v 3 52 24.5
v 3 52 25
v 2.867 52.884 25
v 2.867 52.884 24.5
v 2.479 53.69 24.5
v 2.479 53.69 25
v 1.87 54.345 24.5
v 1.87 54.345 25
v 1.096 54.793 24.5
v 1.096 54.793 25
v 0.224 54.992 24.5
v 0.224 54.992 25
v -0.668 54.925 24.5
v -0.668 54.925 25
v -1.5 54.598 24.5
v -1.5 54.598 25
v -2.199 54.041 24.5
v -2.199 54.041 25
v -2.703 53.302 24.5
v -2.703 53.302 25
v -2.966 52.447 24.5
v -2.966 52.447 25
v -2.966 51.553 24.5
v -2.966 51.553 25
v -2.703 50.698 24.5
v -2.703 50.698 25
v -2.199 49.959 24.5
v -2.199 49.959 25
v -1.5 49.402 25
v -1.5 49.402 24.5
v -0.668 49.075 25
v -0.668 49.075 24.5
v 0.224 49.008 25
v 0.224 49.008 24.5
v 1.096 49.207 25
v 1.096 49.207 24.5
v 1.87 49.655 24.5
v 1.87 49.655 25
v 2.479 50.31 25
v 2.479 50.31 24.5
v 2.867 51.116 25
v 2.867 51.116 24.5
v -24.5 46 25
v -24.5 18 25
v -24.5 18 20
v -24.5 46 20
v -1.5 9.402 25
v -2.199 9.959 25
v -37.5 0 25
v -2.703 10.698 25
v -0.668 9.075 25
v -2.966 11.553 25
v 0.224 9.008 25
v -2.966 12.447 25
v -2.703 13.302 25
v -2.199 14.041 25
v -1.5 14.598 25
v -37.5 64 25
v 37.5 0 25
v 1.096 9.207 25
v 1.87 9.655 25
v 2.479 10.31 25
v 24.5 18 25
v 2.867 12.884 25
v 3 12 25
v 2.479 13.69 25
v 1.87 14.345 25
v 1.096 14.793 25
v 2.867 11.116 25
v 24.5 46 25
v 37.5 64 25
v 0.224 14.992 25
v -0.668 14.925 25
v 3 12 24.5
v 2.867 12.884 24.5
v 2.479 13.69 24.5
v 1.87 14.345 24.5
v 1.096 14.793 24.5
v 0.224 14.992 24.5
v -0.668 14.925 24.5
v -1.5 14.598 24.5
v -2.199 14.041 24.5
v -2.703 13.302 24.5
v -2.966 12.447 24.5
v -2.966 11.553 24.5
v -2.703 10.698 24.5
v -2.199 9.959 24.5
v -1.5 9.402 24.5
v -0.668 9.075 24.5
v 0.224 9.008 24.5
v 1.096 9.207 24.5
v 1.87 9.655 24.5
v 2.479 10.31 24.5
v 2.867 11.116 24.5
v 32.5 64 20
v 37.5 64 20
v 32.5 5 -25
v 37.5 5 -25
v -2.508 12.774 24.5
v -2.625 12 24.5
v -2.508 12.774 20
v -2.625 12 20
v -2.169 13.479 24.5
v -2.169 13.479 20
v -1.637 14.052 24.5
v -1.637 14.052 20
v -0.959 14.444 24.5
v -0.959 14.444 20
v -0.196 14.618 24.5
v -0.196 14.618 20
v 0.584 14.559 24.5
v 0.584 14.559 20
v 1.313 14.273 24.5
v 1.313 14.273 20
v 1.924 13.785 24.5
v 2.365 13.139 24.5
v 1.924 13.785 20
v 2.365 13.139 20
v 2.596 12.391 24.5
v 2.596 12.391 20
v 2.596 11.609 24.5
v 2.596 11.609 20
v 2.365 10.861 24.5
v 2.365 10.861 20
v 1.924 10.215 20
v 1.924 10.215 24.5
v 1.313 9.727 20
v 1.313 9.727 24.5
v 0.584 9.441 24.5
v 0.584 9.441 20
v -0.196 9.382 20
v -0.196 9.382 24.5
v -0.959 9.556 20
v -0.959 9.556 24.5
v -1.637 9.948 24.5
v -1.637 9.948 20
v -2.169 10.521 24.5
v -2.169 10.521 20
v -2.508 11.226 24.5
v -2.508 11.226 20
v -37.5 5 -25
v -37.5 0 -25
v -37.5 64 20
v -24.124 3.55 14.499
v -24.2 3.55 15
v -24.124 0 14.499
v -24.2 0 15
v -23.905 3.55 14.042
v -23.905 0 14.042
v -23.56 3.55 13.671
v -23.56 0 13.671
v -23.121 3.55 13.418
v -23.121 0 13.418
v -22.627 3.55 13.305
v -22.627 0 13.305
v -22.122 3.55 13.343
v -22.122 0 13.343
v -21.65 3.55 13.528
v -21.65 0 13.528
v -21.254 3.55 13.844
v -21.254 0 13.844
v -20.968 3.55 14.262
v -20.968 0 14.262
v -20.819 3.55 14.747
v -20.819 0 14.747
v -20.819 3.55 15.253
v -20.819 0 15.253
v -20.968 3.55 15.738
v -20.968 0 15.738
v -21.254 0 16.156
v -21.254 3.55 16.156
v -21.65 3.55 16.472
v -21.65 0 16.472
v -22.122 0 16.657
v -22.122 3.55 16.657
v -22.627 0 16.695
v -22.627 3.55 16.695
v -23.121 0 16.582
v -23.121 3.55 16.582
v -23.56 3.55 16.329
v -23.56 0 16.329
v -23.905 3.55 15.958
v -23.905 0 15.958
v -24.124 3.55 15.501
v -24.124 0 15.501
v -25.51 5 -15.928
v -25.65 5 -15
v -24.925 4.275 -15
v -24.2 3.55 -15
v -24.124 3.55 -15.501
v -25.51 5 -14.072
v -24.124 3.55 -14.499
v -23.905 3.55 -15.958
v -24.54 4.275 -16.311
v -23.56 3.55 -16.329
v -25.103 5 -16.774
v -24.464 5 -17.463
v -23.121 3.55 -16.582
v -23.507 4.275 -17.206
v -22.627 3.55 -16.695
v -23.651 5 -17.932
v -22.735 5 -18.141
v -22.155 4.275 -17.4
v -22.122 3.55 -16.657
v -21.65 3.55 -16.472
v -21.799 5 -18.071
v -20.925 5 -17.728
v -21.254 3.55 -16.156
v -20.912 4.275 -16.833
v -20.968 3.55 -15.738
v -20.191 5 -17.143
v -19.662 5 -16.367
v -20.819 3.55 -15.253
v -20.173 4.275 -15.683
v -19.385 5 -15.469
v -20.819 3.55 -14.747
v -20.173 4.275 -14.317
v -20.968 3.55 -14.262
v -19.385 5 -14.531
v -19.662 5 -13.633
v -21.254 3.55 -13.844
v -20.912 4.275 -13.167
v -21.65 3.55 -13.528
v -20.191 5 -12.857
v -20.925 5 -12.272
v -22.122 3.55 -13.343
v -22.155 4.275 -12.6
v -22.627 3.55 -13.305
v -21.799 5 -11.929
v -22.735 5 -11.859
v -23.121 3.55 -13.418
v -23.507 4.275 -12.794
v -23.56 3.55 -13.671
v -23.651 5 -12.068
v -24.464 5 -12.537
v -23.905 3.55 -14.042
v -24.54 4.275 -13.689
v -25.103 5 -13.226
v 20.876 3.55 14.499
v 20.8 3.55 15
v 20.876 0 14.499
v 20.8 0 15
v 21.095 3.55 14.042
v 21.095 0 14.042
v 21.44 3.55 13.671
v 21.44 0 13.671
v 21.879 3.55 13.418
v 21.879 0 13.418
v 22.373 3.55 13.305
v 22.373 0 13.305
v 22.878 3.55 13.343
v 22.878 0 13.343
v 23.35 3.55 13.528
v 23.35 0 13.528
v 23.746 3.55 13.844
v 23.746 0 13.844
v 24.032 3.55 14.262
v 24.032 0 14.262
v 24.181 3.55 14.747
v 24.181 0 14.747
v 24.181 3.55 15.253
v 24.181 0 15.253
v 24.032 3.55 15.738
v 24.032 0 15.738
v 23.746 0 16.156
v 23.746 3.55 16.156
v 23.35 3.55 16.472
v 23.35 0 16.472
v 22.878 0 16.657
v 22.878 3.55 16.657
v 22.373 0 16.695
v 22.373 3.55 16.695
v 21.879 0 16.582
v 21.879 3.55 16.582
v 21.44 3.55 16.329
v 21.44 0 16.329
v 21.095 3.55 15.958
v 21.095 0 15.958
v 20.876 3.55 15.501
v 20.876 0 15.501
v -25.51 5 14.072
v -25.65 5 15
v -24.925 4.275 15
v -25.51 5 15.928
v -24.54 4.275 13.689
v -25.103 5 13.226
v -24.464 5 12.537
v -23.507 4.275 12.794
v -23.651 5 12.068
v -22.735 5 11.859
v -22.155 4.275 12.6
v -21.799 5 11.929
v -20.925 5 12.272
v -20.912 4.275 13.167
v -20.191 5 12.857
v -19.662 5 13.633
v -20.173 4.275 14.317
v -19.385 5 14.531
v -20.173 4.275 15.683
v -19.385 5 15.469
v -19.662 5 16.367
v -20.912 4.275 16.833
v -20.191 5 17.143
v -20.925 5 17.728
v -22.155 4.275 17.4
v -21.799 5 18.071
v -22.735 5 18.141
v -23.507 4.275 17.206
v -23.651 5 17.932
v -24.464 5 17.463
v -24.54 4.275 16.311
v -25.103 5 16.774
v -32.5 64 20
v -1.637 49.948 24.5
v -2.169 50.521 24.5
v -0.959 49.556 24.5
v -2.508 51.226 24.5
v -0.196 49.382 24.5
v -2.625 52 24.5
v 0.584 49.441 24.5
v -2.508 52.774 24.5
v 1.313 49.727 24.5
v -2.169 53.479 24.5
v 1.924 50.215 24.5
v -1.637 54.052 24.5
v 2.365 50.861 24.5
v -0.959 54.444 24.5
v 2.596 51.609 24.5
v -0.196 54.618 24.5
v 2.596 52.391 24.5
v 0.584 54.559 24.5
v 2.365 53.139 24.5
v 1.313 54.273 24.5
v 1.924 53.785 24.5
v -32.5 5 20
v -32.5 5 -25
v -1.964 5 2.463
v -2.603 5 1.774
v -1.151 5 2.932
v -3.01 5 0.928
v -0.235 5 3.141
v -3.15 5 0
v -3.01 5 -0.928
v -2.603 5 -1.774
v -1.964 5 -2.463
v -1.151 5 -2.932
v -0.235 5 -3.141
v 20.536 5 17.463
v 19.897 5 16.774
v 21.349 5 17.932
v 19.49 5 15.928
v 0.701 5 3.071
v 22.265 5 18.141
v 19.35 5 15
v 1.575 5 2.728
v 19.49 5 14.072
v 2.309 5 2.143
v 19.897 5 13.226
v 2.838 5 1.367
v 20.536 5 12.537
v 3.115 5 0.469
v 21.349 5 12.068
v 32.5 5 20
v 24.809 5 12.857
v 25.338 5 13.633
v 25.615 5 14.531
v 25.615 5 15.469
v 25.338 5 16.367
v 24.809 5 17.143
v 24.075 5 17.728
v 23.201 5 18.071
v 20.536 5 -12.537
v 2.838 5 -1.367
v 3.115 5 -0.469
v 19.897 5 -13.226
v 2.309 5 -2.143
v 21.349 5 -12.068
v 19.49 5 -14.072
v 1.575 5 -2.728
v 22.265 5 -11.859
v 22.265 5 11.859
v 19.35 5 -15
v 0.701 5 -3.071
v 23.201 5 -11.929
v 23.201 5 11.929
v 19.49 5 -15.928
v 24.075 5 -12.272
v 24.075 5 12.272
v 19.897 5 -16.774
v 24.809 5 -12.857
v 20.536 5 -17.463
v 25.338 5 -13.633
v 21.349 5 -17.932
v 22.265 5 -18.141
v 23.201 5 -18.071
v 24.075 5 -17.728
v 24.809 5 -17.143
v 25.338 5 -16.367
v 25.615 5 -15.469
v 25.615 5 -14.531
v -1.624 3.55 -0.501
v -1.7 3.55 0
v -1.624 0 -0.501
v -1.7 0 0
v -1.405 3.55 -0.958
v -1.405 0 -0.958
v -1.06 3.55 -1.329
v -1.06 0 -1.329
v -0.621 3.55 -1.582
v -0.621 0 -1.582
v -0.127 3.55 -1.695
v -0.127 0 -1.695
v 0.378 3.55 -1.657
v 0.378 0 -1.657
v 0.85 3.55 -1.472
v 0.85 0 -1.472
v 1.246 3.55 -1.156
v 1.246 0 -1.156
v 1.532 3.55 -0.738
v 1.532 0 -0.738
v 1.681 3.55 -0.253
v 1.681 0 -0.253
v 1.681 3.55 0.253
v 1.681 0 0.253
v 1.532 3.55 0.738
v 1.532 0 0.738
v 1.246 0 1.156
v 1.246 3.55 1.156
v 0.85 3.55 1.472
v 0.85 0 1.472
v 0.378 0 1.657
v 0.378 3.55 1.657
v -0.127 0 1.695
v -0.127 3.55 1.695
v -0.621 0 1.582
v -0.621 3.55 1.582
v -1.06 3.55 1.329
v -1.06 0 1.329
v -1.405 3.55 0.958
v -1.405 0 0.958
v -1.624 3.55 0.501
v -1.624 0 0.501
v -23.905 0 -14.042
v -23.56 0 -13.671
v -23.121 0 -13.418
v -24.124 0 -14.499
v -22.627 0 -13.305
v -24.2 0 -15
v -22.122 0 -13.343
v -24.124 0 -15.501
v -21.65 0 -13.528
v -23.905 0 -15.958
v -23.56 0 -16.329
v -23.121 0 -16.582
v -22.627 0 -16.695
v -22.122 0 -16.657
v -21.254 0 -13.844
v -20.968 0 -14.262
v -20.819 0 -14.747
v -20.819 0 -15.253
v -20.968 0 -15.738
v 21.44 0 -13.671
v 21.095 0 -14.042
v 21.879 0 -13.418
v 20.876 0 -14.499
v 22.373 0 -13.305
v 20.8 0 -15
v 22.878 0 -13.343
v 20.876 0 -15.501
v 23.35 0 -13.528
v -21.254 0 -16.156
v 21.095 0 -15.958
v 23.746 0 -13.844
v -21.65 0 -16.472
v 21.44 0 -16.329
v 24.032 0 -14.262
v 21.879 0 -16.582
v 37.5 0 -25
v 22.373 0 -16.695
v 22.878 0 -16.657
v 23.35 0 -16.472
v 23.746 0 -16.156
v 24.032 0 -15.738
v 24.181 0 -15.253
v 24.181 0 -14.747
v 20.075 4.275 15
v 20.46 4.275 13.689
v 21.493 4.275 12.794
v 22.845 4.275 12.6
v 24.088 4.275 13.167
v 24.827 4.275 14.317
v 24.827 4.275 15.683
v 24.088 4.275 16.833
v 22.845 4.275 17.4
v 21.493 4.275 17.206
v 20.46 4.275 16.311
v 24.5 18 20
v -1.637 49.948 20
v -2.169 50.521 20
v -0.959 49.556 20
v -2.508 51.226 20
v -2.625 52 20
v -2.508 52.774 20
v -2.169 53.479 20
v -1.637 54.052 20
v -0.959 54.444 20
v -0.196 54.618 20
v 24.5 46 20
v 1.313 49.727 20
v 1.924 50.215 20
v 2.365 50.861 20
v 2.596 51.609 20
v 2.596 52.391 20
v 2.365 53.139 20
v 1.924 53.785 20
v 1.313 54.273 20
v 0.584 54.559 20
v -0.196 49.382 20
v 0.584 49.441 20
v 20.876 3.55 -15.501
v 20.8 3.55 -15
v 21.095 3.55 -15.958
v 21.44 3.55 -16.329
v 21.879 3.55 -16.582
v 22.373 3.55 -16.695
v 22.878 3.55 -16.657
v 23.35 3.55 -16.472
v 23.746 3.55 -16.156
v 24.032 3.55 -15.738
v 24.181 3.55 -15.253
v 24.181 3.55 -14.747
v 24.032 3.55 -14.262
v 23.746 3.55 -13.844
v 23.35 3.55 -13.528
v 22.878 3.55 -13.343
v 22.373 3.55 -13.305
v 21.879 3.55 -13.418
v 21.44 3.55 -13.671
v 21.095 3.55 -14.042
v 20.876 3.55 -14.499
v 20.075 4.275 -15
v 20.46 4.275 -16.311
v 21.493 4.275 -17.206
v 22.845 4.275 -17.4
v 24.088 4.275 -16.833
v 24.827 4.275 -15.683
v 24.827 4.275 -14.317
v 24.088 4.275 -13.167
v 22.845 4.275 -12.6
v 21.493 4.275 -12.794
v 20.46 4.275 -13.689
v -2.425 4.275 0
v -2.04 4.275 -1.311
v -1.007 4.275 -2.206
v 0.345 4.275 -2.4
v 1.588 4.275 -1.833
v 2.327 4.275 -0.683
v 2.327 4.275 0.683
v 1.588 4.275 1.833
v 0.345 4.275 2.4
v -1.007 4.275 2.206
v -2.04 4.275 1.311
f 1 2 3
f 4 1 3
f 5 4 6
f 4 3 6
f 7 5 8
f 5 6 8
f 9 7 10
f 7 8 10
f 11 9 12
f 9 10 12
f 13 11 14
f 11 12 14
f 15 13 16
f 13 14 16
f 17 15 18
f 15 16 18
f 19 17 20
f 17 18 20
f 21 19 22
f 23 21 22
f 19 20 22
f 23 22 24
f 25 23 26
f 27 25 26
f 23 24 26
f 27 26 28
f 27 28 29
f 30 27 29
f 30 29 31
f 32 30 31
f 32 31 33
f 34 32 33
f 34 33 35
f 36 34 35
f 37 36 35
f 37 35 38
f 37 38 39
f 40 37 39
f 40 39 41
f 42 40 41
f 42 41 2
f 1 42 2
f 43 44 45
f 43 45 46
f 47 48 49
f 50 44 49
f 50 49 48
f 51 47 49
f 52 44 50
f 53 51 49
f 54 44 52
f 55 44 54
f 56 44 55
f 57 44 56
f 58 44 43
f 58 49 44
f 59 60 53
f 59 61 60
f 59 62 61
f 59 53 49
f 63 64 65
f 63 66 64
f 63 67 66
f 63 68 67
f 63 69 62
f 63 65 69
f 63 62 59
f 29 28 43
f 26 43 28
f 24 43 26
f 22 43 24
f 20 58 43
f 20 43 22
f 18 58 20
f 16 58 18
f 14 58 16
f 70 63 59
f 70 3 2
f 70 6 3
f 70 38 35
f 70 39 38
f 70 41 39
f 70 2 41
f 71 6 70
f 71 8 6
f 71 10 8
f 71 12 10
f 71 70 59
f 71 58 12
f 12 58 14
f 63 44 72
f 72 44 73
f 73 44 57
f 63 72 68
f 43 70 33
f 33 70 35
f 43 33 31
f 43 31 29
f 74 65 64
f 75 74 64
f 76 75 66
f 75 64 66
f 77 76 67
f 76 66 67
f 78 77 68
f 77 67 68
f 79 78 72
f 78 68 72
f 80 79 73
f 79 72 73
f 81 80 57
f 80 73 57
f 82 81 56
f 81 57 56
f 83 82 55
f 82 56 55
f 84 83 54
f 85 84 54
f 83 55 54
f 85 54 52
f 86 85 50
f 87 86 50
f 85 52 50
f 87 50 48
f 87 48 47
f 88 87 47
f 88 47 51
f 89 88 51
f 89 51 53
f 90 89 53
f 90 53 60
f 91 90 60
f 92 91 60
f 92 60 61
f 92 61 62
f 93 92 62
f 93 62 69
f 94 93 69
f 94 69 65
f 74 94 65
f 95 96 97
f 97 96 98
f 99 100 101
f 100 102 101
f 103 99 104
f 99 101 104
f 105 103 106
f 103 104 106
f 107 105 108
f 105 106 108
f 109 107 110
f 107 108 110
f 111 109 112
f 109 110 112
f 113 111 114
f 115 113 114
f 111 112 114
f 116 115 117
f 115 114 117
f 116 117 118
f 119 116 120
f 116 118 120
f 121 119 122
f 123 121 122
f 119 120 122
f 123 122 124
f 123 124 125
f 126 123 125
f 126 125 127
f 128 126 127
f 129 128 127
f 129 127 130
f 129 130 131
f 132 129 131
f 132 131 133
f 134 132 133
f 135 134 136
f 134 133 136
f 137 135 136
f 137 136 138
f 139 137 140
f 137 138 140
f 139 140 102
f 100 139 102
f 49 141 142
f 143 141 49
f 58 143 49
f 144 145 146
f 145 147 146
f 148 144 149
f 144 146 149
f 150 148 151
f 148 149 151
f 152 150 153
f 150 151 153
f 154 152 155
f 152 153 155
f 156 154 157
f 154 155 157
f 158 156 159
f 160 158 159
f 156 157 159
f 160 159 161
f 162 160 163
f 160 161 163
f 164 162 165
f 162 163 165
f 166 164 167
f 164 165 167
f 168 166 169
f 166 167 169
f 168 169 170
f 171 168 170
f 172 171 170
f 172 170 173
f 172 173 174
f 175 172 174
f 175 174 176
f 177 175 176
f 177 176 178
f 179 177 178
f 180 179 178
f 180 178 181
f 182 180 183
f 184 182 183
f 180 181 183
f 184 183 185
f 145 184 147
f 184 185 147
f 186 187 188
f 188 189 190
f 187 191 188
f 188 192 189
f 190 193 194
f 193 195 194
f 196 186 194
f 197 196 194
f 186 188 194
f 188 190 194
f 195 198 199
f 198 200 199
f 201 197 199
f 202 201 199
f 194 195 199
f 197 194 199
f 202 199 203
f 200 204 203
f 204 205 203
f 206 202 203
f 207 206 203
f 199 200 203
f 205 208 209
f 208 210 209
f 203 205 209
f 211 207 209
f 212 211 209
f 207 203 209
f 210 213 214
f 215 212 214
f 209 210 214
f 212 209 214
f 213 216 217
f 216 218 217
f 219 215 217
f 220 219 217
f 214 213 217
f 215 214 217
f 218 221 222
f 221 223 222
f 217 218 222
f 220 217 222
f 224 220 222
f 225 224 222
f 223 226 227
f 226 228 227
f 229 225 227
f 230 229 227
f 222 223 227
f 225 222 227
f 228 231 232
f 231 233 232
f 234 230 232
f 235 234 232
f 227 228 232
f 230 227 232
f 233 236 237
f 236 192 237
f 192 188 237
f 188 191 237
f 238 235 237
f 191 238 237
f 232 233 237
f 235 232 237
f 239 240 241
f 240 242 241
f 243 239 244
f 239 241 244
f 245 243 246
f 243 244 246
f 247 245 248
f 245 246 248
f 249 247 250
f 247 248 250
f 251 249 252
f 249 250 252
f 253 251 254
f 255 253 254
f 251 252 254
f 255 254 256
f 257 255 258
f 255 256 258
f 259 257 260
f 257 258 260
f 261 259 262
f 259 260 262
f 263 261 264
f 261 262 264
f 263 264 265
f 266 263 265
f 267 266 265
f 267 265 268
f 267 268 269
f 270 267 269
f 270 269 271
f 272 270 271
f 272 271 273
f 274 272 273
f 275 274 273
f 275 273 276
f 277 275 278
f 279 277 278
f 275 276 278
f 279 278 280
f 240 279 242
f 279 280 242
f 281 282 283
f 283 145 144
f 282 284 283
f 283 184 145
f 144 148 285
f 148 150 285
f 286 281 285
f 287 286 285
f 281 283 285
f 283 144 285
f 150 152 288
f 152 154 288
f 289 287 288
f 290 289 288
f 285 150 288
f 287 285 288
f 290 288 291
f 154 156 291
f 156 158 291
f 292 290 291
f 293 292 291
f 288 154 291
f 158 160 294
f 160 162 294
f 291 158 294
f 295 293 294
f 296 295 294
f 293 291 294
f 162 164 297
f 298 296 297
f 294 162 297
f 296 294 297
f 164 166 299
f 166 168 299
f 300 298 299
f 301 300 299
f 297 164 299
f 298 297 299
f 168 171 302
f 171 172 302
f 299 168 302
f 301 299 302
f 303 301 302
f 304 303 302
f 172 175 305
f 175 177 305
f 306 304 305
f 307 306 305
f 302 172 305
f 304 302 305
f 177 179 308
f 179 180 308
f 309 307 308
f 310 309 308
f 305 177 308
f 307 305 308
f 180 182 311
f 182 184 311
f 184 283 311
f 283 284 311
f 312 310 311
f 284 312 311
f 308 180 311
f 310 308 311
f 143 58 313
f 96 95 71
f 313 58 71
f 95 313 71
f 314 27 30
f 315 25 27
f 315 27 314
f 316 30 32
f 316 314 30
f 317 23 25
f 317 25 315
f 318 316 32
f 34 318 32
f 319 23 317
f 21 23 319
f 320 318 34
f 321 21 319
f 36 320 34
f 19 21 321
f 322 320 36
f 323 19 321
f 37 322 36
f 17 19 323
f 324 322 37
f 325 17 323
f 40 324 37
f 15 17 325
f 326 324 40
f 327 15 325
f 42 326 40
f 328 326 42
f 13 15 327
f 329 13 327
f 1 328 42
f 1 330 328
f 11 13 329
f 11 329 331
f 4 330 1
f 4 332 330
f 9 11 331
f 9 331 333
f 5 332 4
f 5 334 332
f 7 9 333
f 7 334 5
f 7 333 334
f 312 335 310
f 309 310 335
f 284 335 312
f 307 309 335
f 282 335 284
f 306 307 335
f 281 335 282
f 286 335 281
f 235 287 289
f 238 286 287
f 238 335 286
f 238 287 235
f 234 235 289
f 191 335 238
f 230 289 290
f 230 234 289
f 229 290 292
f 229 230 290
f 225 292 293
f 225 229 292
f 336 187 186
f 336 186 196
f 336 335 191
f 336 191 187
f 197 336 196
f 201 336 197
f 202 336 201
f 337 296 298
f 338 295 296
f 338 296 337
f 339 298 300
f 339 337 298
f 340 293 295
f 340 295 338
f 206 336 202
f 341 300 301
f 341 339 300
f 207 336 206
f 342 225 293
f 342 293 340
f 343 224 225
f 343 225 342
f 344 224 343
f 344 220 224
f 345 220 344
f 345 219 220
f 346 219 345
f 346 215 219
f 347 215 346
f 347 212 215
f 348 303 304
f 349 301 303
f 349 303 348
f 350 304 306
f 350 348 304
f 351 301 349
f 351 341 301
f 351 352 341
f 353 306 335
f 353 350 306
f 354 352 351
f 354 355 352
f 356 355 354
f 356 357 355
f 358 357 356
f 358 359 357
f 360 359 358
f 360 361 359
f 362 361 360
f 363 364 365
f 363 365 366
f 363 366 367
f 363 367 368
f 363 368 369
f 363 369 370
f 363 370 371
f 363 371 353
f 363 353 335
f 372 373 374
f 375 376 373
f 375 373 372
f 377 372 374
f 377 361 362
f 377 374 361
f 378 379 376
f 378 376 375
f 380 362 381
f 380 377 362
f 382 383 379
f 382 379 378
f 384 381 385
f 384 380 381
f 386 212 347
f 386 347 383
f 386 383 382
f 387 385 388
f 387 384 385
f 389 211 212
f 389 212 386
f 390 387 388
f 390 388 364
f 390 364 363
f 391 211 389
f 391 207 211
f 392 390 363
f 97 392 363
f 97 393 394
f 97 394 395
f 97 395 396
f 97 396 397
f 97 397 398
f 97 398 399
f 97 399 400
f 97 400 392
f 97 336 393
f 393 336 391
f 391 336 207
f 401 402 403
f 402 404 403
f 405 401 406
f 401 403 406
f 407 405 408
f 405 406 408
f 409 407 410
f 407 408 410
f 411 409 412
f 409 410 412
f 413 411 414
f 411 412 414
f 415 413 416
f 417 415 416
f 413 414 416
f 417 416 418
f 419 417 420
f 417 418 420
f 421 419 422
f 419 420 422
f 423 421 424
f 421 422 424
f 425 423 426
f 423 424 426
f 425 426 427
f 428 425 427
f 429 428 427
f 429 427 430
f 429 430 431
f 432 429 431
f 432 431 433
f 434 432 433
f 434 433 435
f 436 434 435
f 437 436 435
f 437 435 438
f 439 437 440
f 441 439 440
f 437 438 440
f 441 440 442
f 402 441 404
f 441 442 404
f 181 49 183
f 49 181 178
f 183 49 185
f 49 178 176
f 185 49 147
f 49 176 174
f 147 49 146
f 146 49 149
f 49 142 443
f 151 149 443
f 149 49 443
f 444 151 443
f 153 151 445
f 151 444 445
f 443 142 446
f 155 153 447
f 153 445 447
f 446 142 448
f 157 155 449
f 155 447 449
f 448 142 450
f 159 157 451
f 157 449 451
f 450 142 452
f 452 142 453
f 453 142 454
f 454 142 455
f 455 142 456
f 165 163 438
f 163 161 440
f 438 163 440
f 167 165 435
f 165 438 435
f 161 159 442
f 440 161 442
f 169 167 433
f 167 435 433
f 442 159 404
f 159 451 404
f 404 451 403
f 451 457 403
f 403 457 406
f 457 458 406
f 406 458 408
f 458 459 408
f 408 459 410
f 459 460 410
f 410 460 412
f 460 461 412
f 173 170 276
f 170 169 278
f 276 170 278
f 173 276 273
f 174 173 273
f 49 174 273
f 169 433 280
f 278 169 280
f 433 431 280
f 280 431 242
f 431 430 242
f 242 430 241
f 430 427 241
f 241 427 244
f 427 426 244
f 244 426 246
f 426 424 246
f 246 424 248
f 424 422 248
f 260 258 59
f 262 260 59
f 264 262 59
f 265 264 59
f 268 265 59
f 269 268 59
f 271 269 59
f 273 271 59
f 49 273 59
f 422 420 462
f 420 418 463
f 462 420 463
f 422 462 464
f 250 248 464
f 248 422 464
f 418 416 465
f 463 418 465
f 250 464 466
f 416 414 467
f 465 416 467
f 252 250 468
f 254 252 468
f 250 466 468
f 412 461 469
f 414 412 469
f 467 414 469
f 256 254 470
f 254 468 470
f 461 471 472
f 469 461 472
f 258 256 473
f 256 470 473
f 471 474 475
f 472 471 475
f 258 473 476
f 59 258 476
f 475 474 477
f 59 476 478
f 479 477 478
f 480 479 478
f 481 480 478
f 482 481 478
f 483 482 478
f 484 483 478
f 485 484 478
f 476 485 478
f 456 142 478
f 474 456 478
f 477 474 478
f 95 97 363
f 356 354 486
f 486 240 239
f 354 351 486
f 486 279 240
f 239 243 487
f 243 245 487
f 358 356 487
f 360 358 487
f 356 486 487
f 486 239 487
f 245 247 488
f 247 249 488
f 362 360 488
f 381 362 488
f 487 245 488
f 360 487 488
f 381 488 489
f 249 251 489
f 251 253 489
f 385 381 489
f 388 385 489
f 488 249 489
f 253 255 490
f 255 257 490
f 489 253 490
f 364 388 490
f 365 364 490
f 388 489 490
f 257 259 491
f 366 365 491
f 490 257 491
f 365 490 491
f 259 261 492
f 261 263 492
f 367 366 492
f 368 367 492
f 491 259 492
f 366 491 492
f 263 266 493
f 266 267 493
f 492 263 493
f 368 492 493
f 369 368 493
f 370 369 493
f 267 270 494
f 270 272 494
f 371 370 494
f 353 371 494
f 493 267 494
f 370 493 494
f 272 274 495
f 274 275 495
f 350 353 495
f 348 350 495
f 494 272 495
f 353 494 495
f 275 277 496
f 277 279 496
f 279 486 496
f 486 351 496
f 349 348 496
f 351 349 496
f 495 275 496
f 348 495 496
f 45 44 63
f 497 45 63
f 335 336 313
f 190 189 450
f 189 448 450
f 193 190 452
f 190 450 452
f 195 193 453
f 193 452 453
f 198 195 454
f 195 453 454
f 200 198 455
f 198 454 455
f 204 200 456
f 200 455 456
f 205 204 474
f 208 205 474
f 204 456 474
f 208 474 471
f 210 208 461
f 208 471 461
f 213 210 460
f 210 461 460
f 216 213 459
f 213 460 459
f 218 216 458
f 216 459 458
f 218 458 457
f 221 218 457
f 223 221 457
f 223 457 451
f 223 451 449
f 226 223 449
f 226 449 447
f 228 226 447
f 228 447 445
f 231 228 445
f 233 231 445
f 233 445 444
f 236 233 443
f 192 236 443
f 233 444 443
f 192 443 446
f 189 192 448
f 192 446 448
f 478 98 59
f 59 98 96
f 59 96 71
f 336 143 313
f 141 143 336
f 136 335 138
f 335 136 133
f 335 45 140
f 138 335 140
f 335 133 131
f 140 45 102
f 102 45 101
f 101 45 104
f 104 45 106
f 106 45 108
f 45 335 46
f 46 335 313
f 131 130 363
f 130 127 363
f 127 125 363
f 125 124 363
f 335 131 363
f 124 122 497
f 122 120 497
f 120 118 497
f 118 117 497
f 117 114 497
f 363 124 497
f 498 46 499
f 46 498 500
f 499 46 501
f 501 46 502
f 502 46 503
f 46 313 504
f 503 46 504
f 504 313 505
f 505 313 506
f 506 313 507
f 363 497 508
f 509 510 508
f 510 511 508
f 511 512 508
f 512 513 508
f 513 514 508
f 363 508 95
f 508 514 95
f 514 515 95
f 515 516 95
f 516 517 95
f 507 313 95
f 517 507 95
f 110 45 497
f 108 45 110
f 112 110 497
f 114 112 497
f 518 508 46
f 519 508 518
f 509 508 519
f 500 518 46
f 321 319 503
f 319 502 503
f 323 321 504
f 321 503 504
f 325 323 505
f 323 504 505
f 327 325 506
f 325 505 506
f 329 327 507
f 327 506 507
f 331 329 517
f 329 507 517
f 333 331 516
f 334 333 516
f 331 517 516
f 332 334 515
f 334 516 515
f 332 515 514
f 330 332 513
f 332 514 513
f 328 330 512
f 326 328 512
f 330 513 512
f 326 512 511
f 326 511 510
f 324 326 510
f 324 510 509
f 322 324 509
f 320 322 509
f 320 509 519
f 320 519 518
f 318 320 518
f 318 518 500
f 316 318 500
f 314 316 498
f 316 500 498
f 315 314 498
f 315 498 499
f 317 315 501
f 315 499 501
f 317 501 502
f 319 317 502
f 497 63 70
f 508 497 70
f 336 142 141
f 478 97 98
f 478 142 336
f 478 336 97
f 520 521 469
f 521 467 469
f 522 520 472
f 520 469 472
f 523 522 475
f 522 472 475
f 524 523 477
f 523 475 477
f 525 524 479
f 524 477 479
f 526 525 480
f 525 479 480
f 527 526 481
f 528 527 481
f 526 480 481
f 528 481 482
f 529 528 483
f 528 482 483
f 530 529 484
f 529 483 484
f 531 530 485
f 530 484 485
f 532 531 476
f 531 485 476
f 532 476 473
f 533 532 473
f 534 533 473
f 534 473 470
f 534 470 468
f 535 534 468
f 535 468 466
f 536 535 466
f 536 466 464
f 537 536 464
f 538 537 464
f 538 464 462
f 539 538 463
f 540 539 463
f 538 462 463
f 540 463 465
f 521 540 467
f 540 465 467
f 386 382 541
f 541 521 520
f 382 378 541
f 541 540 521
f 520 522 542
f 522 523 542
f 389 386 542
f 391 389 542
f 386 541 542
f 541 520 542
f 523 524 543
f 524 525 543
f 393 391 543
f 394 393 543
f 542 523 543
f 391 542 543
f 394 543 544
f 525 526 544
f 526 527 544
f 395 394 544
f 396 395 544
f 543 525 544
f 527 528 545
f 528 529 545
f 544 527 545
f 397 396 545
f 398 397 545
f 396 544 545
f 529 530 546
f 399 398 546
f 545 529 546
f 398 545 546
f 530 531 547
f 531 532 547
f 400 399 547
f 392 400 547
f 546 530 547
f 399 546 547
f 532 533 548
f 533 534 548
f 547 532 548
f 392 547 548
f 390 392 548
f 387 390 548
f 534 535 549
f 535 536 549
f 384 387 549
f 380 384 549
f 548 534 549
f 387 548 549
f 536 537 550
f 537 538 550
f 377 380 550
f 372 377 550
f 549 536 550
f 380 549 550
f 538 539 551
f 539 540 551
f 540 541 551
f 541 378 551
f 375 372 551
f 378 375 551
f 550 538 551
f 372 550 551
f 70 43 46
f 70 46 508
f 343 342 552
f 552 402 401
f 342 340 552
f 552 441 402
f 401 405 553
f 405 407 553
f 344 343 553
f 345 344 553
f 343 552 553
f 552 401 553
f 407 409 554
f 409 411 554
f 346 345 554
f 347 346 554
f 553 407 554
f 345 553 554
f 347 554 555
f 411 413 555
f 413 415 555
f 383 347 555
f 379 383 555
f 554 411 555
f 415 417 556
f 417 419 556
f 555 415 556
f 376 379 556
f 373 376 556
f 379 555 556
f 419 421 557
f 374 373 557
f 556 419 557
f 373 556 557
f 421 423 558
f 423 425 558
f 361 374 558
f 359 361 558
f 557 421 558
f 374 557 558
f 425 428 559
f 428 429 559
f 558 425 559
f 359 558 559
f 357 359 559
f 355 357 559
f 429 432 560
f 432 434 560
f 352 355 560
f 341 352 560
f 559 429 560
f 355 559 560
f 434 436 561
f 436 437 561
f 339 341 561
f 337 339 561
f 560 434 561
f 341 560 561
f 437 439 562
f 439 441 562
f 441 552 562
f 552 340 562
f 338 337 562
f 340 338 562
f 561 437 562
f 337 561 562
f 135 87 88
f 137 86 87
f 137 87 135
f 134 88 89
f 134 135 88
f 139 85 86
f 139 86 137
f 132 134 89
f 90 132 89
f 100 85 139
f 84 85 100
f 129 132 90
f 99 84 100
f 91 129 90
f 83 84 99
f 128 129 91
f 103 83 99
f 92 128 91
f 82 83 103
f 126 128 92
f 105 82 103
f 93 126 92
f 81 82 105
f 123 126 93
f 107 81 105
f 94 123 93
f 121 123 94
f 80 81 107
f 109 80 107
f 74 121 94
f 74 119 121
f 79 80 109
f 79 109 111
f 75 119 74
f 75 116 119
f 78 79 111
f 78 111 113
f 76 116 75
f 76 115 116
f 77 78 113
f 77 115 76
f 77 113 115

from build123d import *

# Parameters (mm, degrees)
SKETCH1_W                                       = 75
SKETCH1_H                                       = 50
BOSS_EXTRUDE1_DEPTH                             = 5
SKETCH2_W                                       = 75
SKETCH2_H                                       = 59
SKETCH2_W_2                                     = 49
SKETCH2_H_2                                     = 28
BOSS_EXTRUDE2_DEPTH                             = 5
BOSS_EXTRUDE3_DEPTH                             = 5
BOSS_EXTRUDE4_START                             = -75
BOSS_EXTRUDE4_DEPTH                             = 5
CBORE_FOR_M3_SHCS1_D                            = 5.25
CBORE_FOR_M3_SHCS1_DEPTH                        = 5
CBORE_FOR_M3_SHCS1_CBORE_D                      = 6
CBORE_FOR_M3_SHCS1_CBORE_DEPTH                  = 0.5
CBORE_FOR_M3_SHCS1_TIP                          = 1.577259125
CSK_FOR_M3_FLAT_HEAD_MACHINE_SCREW1_D           = 3.4
CSK_FOR_M3_FLAT_HEAD_MACHINE_SCREW1_CSINK_D     = 6.3
CSK_FOR_M3_FLAT_HEAD_MACHINE_SCREW1_CSINK_ANGLE = 90


with BuildPart() as part:
    # Sketch1 → Boss-Extrude1 (new body)
    with BuildSketch(Plane(origin=(0, 0, 0), x_dir=(1, 0, 0), z_dir=(0, 1, 0))):
        Rectangle(SKETCH1_W, SKETCH1_H)
    extrude(amount=BOSS_EXTRUDE1_DEPTH)

    # Sketch2 → Boss-Extrude2 (add)
    with BuildSketch(Plane.XY.offset(25)):
        with Locations((0, 34.5)):
            Rectangle(SKETCH2_W, SKETCH2_H)
        with Locations((0, 32)):
            Rectangle(SKETCH2_W_2, SKETCH2_H_2, mode=Mode.SUBTRACT)
    extrude(amount=-BOSS_EXTRUDE2_DEPTH)

    # Sketch3 → Boss-Extrude3 (add)
    with BuildSketch(Plane(origin=(37.5, 0, 0), x_dir=(0, 0, -1), z_dir=(1, 0, 0))):
        Polygon((-20, 64), (25, 5), (-20, 5), align=None)
    extrude(amount=-BOSS_EXTRUDE3_DEPTH)

    # Sketch3<2> → Boss-Extrude4 (add)
    with BuildSketch(Plane(origin=(37.5, 0, 0), x_dir=(0, 0, -1), z_dir=(1, 0, 0)).offset(BOSS_EXTRUDE4_START)):
        Polygon((-20, 64), (25, 5), (-20, 5), align=None)
    extrude(amount=BOSS_EXTRUDE4_DEPTH)

    # CBORE for M3 SHCS1
    with Locations(Plane.XY.offset(25)):
        with Locations((0, 52), (0, 12)):
            CounterBoreHole(CBORE_FOR_M3_SHCS1_D / 2, CBORE_FOR_M3_SHCS1_CBORE_D / 2, CBORE_FOR_M3_SHCS1_CBORE_DEPTH, depth=CBORE_FOR_M3_SHCS1_DEPTH)
            with Locations((0, 0, -(CBORE_FOR_M3_SHCS1_DEPTH + CBORE_FOR_M3_SHCS1_TIP / 2))):  # 118° drill point
                Cone(0, CBORE_FOR_M3_SHCS1_D / 2, CBORE_FOR_M3_SHCS1_TIP, mode=Mode.SUBTRACT)

    # CSK for M3 Flat Head Machine Screw1 (through all)
    with Locations(Plane(origin=(0, 5, 0), x_dir=(1, 0, 0), z_dir=(0, 1, 0))):
        with Locations((22.5, 15), (0, 0), (-22.5, 15), (-22.5, -15), (22.5, -15)):
            CounterSinkHole(CSK_FOR_M3_FLAT_HEAD_MACHINE_SCREW1_D / 2, CSK_FOR_M3_FLAT_HEAD_MACHINE_SCREW1_CSINK_D / 2, counter_sink_angle=CSK_FOR_M3_FLAT_HEAD_MACHINE_SCREW1_CSINK_ANGLE)


solid = part.part
